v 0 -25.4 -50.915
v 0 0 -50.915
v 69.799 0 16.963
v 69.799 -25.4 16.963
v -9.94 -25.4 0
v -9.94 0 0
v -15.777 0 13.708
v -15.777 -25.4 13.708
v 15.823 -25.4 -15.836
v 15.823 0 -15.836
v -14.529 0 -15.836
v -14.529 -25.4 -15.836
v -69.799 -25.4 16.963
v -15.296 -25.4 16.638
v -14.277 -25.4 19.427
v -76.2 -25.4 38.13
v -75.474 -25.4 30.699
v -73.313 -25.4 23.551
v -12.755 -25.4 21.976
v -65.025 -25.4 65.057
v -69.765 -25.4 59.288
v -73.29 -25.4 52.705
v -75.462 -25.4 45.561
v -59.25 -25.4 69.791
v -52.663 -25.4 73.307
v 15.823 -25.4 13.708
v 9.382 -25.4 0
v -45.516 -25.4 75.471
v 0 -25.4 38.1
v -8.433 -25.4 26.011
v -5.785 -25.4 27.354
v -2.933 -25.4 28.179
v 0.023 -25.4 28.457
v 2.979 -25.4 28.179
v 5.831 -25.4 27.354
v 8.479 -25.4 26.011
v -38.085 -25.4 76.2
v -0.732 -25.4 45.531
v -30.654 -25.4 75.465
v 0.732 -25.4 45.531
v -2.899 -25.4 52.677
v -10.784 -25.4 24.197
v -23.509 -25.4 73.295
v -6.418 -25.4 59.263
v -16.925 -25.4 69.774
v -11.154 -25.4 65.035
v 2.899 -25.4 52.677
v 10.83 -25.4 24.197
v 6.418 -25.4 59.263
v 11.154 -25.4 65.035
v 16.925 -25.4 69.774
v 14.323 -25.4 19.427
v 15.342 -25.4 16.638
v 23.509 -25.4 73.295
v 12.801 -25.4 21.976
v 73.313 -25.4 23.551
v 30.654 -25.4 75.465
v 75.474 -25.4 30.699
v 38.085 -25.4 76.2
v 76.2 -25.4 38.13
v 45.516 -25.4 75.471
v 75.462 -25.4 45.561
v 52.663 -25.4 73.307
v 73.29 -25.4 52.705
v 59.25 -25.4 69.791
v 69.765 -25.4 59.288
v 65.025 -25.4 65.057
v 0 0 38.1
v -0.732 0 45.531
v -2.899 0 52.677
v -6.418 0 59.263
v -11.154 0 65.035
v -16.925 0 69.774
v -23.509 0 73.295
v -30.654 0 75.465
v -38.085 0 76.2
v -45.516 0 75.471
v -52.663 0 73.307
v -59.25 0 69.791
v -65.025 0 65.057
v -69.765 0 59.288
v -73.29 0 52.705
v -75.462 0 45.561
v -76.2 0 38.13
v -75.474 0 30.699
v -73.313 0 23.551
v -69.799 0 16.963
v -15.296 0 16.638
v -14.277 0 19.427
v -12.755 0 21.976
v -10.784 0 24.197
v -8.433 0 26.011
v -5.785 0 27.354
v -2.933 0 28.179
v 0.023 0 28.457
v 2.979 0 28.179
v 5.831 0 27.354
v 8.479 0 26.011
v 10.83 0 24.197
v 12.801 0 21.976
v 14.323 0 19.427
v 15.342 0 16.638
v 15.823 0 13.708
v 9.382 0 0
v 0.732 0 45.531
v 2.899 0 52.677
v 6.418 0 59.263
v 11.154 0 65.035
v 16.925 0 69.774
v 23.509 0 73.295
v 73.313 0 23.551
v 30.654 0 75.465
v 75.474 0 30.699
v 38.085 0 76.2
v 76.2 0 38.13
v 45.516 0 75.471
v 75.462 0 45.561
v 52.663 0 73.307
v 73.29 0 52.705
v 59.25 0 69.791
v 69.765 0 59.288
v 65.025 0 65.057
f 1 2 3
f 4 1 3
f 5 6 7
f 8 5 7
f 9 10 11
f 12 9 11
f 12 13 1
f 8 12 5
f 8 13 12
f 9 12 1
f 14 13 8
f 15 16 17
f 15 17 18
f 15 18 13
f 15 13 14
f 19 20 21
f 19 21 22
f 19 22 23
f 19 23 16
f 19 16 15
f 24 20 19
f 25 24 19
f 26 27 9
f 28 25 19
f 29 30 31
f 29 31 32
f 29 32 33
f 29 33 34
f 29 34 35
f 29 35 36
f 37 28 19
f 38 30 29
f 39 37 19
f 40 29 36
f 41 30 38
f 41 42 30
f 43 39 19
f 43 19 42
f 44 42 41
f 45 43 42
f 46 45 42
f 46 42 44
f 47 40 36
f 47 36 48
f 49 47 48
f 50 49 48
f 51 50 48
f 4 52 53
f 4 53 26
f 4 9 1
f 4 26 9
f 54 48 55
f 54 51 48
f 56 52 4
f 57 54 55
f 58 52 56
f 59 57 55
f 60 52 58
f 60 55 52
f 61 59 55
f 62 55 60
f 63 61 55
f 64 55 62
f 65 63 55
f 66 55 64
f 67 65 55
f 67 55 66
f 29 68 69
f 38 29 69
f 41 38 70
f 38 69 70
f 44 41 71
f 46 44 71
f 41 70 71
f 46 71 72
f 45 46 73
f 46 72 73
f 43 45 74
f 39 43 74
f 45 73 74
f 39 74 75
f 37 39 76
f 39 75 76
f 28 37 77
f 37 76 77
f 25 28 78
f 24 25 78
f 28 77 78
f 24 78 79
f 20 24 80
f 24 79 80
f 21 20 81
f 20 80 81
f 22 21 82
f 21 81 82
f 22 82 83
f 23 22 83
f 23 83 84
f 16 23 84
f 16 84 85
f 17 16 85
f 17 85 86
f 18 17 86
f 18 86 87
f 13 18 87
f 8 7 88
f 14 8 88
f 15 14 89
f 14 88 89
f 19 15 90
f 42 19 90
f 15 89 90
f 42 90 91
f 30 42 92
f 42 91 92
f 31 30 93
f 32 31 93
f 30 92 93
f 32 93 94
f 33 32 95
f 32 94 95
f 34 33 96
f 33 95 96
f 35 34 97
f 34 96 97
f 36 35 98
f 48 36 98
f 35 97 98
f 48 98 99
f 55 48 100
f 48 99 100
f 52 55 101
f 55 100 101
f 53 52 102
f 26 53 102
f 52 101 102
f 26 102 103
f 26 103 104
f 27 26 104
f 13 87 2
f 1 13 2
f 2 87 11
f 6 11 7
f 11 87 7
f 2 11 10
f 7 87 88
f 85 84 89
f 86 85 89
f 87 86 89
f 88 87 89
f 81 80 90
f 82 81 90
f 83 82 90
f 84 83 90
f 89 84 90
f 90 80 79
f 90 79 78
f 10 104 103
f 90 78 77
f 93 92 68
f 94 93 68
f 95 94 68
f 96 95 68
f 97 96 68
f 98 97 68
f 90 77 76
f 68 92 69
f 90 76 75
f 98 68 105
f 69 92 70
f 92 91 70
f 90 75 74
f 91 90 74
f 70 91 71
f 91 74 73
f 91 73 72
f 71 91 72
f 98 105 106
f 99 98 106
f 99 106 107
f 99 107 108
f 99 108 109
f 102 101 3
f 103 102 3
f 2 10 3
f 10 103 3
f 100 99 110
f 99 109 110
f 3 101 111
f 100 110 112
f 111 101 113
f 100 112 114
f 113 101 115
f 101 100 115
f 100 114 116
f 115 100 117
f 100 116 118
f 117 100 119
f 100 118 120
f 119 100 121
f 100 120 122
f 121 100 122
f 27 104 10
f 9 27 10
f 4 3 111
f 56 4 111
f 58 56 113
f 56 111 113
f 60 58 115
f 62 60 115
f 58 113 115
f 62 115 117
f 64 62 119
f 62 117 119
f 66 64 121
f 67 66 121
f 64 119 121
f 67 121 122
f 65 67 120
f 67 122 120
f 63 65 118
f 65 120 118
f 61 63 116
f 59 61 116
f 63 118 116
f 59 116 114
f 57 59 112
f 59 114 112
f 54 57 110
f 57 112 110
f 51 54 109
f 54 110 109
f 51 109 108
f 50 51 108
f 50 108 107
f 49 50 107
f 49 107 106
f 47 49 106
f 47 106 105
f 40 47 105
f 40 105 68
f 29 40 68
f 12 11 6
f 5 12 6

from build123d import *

# Parameters (mm, degrees)
F1_DEPTH = 25.4


with BuildPart() as f1:
    # F0 (on Front) → F1 (new body)
    with BuildSketch(Plane.XZ):
        with BuildLine():
            ThreePointArc((69.798931, 16.962646), (49.142661, 74.564636), (0, 38.1))
            ThreePointArc((0, 38.1), (-49.142661, 74.564636), (-69.798931, 16.962646))
            Line((-69.798931, 16.962646), (0, -50.915454))
            Line((0, -50.915454), (69.798931, 16.962646))
        make_face()
        with BuildLine():
            ThreePointArc((-15.777161, 13.708008), (0.022895, 28.457214), (15.822951, 13.708008))
            Line((15.822951, 13.708008), (9.382167, 0))
            Line((9.382167, 0), (15.822951, -15.835773))
            Line((15.822951, -15.835773), (-14.52887, -15.835773))
            Line((-14.52887, -15.835773), (-9.940196, 0))
            Line((-9.940196, 0), (-15.777161, 13.708008))
        make_face(mode=Mode.SUBTRACT)
    extrude(amount=F1_DEPTH)


solid = f1.part
